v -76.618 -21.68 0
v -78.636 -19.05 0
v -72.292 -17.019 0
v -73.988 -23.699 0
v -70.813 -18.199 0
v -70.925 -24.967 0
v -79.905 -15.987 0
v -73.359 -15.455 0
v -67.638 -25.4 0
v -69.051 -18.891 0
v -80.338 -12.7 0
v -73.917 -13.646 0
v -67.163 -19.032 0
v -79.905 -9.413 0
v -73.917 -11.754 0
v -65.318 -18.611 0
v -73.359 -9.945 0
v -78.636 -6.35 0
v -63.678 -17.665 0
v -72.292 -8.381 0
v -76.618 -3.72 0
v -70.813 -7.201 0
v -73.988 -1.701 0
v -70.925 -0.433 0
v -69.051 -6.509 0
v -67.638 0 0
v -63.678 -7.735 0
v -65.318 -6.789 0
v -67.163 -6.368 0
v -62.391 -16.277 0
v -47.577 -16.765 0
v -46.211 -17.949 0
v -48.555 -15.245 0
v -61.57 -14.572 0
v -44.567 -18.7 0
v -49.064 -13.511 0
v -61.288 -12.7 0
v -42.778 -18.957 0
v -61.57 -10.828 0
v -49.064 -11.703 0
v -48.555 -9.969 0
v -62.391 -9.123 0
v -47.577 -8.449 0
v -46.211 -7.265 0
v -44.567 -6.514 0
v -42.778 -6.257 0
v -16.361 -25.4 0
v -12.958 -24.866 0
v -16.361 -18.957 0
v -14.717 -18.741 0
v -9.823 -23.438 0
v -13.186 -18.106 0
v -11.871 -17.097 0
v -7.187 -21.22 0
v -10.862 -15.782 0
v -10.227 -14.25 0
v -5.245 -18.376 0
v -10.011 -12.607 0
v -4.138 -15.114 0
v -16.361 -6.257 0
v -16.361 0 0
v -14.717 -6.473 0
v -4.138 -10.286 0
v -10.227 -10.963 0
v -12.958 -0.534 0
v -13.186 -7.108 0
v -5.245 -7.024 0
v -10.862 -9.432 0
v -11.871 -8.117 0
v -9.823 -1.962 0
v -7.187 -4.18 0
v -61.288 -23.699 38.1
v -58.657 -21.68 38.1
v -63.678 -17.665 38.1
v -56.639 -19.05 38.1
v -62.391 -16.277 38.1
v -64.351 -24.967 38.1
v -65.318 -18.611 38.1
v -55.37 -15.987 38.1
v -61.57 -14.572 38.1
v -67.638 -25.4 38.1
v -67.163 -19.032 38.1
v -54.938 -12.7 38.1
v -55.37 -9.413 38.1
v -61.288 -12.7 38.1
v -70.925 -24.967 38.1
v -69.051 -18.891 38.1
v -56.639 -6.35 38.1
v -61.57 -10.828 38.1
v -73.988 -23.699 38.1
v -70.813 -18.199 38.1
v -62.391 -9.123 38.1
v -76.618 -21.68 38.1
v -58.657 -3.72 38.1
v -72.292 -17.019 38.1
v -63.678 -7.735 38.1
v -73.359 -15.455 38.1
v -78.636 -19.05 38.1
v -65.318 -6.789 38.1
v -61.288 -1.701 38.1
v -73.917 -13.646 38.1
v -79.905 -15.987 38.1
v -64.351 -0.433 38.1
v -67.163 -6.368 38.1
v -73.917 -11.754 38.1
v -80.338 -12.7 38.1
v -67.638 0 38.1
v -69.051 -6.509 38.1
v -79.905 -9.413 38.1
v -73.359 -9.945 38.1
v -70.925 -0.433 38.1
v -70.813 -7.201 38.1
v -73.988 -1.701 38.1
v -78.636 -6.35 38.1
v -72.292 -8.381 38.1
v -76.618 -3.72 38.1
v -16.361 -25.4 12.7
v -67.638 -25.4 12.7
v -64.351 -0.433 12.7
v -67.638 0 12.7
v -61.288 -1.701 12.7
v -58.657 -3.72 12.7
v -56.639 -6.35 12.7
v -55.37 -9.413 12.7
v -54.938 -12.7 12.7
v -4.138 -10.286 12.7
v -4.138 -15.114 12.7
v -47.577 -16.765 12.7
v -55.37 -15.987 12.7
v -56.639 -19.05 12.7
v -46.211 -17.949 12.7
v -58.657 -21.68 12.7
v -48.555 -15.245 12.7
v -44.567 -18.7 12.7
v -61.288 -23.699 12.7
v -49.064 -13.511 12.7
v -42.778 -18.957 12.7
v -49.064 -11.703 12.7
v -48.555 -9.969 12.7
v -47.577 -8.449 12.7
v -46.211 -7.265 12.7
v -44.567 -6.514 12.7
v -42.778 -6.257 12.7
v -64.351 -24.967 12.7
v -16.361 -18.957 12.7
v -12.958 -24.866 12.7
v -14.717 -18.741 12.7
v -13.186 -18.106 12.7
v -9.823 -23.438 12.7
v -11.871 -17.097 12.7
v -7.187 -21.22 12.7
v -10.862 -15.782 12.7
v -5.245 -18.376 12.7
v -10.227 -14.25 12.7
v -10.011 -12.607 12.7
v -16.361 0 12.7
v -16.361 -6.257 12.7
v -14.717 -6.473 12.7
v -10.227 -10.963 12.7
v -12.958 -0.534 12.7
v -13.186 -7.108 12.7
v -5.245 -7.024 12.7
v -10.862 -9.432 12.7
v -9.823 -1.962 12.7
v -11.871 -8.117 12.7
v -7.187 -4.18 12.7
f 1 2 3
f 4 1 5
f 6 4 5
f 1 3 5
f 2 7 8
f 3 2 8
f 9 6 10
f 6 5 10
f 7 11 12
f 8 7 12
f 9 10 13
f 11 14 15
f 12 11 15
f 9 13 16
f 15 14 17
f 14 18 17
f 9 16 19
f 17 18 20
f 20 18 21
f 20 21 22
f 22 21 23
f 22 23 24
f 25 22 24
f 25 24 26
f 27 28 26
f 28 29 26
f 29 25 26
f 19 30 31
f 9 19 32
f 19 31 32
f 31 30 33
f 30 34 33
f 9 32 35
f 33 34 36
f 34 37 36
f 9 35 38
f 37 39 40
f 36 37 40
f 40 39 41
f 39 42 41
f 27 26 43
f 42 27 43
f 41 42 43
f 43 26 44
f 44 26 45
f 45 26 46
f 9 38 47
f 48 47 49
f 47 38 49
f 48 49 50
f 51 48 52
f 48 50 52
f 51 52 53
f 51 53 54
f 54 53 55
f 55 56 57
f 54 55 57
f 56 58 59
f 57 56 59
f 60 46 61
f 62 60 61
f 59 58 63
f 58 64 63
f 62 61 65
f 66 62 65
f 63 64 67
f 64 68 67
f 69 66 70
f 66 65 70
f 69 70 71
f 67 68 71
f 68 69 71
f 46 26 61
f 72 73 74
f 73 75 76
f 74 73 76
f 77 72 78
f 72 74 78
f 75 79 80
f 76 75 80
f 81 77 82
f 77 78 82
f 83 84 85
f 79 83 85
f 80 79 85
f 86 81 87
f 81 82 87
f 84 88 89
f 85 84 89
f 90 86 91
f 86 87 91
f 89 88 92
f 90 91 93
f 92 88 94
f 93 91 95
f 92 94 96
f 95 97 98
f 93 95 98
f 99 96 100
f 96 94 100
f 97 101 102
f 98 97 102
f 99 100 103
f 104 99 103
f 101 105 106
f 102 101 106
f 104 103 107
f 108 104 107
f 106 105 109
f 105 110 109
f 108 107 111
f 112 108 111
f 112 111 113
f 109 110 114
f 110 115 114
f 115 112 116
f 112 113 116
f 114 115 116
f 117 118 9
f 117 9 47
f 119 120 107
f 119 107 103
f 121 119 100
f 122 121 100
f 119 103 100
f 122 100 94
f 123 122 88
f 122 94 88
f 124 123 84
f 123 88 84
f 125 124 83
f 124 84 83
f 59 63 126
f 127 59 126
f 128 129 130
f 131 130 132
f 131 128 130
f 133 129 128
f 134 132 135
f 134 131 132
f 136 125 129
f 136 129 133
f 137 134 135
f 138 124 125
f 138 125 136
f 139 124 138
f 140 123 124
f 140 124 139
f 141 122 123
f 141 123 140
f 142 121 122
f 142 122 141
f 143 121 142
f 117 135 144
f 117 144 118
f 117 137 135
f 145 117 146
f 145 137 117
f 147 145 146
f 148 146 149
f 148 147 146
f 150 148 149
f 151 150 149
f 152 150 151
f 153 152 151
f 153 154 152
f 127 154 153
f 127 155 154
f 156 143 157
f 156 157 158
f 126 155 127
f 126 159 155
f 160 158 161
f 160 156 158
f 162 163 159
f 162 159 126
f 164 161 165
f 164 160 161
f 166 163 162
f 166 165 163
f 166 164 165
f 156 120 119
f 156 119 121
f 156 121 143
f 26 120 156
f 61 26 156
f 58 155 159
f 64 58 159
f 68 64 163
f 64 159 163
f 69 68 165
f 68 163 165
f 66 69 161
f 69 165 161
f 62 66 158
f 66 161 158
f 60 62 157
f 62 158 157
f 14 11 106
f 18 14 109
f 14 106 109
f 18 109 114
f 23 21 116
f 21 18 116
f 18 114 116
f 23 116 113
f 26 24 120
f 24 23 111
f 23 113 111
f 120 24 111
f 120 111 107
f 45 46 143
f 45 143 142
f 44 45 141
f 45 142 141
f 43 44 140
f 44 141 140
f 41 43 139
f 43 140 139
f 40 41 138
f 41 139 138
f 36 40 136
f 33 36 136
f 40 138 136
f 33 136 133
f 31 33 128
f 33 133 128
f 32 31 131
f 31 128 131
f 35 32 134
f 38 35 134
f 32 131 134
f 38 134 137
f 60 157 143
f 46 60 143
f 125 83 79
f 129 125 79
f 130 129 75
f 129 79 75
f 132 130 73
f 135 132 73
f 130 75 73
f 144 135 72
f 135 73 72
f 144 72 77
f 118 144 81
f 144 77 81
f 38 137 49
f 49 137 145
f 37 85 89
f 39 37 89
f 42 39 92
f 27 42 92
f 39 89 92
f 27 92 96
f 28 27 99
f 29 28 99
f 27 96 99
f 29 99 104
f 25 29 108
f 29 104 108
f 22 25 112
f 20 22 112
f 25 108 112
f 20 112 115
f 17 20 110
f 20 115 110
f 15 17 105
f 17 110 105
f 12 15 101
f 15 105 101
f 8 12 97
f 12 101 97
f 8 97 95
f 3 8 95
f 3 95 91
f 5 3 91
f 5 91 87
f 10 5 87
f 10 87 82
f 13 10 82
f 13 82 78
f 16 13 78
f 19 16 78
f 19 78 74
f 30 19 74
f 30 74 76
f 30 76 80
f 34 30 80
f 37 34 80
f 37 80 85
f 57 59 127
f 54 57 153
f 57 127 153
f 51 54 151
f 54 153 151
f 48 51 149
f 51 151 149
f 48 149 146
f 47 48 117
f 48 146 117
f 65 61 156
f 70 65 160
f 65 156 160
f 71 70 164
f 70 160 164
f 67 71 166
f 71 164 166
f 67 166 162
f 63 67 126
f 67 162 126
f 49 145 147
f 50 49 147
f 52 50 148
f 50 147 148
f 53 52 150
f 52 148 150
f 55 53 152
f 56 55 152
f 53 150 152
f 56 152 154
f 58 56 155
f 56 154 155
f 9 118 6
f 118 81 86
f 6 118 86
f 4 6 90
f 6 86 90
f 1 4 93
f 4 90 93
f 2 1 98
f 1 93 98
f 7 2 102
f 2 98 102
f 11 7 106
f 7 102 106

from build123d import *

# Parameters (mm, degrees)
F1_DEPTH = 25.4
F3_DEPTH = 12.701
F4_R     = 6.35
F5_DEPTH = 38.101
F7_DEPTH = 25.4


with BuildPart() as f1:
    # F0 (on Front) → F1 (new body)
    with BuildSketch(Plane.XZ):
        Polygon((-54.9375581781, 38.1), (-80.3375581781, 38.1), (-80.3375581781, 0), (-4.1375581781, 0), (-4.1375581781, 12.7), (-54.9375581781, 12.7), align=None)
    extrude(amount=F1_DEPTH)

    # F2 (on face) → F3 (cut, through all)
    with BuildSketch(Plane.XY.offset(12.7)):
        with BuildLine():
            ThreePointArc((-36.4283830897, -12.6069579273), (-38.2882550292, -8.1168298668), (-42.7783830897, -6.2569579273))
            ThreePointArc((-42.7783830897, -6.2569579273), (-49.1283830897, -12.6069579273), (-42.7783830897, -18.9569579273))
            ThreePointArc((-42.7783830897, -18.9569579273), (-38.2882550292, -17.0970859879), (-36.4283830897, -12.6069579273))
        make_face()
        with BuildLine():
            ThreePointArc((-16.3607828855, -18.9569579273), (-22.7107828855, -12.6069579273), (-16.3607828855, -6.2569579273))
            Line((-16.3607828855, -6.2569579273), (-42.7783830897, -6.2569579273))
            ThreePointArc((-42.7783830897, -6.2569579273), (-38.2882550292, -8.1168298668), (-36.4283830897, -12.6069579273))
            ThreePointArc((-36.4283830897, -12.6069579273), (-38.2882550292, -17.0970859879), (-42.7783830897, -18.9569579273))
            Line((-42.7783830897, -18.9569579273), (-16.3607828855, -18.9569579273))
        make_face()
        with BuildLine():
            ThreePointArc((-16.3607828855, -18.9569579273), (-11.870654825, -17.0970859879), (-10.0107828855, -12.6069579273))
            ThreePointArc((-10.0107828855, -12.6069579273), (-11.870654825, -8.1168298668), (-16.3607828855, -6.2569579273))
            ThreePointArc((-16.3607828855, -6.2569579273), (-22.7107828855, -12.6069579273), (-16.3607828855, -18.9569579273))
        make_face()
        with BuildLine():
            ThreePointArc((-16.3607828855, 0), (-8.4297023381, -2.981044621), (-4.1375581781, -10.2862594838))
            Line((-4.1375581781, -10.2862594838), (-4.1375581781, 0))
            Line((-4.1375581781, 0), (-16.3607828855, 0))
        make_face()
        with BuildLine():
            ThreePointArc((-4.1375581781, -15.1137405162), (-8.4297023381, -22.418955379), (-16.3607828855, -25.4))
            Line((-16.3607828855, -25.4), (-4.1375581781, -25.4))
            Line((-4.1375581781, -25.4), (-4.1375581781, -15.1137405162))
        make_face()
    extrude(amount=-F3_DEPTH, mode=Mode.SUBTRACT)

    # F4 (on face) → F5 (cut, through all)
    with BuildSketch(Plane.XY.offset(38.1)):
        with BuildLine():
            ThreePointArc((-80.3375581781, -12.7), (-76.6178142992, -3.7197438789), (-67.6375581781, 0))
            Line((-67.6375581781, 0), (-80.3375581781, 0))
            Line((-80.3375581781, 0), (-80.3375581781, -12.7))
        make_face()
        with BuildLine():
            Line((-80.3375581781, -25.4), (-67.6375581781, -25.4))
            ThreePointArc((-67.6375581781, -25.4), (-76.6178142992, -21.6802561211), (-80.3375581781, -12.7))
            Line((-80.3375581781, -12.7), (-80.3375581781, -25.4))
        make_face()
        with Locations((-67.6375581781, -12.7)):
            Circle(F4_R)
    extrude(amount=-F5_DEPTH, mode=Mode.SUBTRACT)

    # F6 (on face) → F7 (cut)
    with BuildSketch(Plane.XY.offset(38.1)):
        with BuildLine():
            ThreePointArc((-54.9375581781, -12.7), (-58.657302057, -21.6802561211), (-67.6375581781, -25.4))
            Line((-67.6375581781, -25.4), (-54.9375581781, -25.4))
            Line((-54.9375581781, -25.4), (-54.9375581781, -12.7))
        make_face()
        with BuildLine():
            ThreePointArc((-67.6375581781, 0), (-58.657302057, -3.7197438789), (-54.9375581781, -12.7))
            Line((-54.9375581781, -12.7), (-54.9375581781, 0))
            Line((-54.9375581781, 0), (-67.6375581781, 0))
        make_face()
    extrude(amount=-F7_DEPTH, mode=Mode.SUBTRACT)


solid = f1.part
